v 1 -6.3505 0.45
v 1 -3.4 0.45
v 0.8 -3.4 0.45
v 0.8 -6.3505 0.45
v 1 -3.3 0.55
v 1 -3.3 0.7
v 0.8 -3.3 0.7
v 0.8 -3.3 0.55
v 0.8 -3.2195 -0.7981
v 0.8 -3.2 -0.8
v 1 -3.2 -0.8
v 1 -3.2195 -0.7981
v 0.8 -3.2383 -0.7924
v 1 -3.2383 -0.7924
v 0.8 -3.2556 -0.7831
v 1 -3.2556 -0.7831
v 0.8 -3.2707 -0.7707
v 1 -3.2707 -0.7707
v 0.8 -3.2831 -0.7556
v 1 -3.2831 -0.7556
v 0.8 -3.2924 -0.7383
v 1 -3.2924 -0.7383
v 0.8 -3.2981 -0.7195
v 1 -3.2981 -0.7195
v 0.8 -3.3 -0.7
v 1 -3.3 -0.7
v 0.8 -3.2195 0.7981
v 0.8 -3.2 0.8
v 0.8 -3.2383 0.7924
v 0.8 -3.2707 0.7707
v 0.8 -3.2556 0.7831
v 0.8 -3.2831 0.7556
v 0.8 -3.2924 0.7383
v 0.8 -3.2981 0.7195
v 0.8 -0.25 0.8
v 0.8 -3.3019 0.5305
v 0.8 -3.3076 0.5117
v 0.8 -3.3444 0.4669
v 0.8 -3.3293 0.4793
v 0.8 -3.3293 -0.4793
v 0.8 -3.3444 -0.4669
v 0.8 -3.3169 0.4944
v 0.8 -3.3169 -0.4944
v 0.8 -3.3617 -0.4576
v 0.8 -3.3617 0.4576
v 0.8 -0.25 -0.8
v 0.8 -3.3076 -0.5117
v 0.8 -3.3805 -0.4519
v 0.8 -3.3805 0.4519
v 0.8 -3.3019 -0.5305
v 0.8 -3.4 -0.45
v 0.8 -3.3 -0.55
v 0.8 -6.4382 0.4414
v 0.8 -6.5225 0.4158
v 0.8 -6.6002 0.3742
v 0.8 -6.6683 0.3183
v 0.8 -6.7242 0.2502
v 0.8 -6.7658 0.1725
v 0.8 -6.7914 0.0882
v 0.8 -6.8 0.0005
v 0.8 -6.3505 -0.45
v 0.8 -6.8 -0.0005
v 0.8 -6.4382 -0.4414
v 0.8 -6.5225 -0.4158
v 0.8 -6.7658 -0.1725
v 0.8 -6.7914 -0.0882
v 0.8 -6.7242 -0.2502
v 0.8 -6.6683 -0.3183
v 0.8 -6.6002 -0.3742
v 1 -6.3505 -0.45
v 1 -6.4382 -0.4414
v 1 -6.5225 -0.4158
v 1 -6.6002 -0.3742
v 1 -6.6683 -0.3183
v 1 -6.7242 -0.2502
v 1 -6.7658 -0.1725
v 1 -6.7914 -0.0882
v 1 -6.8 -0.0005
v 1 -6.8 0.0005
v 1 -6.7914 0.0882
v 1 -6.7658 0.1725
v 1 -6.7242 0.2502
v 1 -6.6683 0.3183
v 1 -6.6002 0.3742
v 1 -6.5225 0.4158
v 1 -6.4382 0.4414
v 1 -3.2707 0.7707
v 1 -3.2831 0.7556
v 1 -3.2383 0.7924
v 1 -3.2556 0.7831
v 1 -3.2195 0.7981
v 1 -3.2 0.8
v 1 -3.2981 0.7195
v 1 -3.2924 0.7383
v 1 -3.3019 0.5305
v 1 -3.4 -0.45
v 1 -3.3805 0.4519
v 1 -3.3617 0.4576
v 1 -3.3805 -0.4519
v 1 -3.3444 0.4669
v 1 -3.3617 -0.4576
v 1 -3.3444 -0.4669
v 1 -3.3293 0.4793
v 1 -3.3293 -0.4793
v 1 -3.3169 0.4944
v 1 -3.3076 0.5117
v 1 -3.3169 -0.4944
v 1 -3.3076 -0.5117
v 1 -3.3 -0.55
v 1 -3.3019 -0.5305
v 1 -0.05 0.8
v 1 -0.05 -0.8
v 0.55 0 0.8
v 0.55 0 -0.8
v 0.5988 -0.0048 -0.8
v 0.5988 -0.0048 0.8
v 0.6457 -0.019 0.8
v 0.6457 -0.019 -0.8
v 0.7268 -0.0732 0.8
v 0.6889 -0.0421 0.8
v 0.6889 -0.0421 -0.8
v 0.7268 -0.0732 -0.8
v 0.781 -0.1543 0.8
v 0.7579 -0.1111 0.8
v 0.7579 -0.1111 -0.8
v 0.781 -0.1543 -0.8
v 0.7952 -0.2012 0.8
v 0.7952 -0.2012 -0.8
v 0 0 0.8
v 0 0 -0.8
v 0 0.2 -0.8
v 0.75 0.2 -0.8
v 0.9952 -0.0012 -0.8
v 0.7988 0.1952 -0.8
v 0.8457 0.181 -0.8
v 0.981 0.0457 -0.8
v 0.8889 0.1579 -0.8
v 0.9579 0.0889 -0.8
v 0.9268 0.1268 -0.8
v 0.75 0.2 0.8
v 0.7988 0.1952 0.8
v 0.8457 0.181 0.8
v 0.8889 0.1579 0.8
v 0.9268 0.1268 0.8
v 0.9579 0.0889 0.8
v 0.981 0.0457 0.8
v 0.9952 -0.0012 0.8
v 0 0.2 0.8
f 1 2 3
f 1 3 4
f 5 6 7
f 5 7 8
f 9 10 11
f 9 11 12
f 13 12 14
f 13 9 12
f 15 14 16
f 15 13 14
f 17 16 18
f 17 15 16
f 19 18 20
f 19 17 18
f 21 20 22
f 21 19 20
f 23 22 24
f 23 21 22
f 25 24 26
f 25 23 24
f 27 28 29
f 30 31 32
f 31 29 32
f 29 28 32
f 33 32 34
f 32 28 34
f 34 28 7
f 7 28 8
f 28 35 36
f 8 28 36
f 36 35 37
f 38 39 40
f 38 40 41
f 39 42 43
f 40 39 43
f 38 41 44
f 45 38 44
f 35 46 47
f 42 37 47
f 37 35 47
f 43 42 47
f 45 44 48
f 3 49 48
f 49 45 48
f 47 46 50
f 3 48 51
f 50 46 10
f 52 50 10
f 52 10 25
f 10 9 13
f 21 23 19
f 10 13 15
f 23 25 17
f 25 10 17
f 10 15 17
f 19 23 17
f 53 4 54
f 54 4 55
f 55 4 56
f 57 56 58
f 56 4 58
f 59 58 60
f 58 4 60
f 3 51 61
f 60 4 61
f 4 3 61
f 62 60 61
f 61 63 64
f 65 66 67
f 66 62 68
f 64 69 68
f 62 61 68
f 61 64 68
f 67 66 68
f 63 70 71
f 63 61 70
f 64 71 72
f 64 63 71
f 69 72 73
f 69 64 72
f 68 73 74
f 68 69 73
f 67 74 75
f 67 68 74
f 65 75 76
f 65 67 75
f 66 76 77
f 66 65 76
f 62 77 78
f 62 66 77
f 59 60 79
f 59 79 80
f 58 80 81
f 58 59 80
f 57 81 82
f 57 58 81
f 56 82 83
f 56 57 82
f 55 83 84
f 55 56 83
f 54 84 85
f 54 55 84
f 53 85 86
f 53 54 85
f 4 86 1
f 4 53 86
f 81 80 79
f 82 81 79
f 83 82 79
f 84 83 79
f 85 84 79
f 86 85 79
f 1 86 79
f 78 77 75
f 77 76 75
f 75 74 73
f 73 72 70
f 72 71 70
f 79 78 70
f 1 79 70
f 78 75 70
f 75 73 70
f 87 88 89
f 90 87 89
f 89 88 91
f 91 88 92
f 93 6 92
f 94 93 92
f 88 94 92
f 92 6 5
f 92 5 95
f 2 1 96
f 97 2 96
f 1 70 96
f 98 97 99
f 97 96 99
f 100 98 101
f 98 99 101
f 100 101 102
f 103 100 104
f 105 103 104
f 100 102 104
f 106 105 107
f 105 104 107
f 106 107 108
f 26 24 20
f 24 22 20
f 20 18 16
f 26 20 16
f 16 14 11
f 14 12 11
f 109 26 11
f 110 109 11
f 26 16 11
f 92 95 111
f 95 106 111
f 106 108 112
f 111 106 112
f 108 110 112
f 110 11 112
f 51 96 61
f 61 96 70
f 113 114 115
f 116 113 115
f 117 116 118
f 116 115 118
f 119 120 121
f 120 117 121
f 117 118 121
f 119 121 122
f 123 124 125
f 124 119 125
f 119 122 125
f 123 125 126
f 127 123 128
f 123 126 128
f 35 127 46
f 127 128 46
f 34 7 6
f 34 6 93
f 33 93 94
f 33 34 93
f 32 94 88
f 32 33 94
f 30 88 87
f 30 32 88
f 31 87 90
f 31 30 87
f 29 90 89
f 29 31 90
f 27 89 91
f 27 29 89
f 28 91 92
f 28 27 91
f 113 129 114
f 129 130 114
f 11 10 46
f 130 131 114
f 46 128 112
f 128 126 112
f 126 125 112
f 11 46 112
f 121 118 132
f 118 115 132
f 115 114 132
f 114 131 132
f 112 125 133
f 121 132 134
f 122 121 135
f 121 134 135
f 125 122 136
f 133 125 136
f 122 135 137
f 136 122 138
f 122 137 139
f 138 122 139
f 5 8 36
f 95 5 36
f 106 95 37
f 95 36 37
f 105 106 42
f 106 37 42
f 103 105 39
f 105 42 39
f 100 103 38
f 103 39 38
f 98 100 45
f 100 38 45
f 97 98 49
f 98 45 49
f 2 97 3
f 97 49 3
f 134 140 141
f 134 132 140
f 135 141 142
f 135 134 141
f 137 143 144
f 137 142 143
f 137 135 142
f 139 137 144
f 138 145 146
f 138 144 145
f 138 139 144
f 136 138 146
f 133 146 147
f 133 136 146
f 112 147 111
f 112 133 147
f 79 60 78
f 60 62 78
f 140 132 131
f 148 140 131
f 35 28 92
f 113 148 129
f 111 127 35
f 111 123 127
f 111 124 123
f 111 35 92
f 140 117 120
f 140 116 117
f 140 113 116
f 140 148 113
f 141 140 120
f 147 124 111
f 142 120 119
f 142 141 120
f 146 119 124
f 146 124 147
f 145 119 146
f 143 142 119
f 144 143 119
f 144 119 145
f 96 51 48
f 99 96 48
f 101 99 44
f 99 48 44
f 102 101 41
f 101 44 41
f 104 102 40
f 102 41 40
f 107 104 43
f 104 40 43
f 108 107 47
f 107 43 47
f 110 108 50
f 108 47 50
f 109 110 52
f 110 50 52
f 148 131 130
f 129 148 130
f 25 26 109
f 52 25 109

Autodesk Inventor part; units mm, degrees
ref_plane "YZ Plane" through (0, 0, 0) normal (1, 0, 0) x (0, 1, 0)
ref_plane "XZ Plane" through (0, 0, 0) normal (0, 1, 0) x (-1, 0, 0)
ref_plane "XY Plane" through (0, 0, 0) normal (0, 0, 1) x (1, 0, 0)
sketch "Sketch1" plane through (0, 0, 0) normal (0, 0, 1) x (1, 0, 0)
  line L0 (0, 0) -> (0.55, 0)
  line L1 (0.8, -0.25) -> (0.8, -6.8)
  line L2 (0.8, -6.8) -> (1, -6.8)
  line L3 (1, -6.8) -> (1, -0.05)
  line L4 (0.75, 0.2) -> (0, 0.2)
  line L5 (0, 0.2) -> (0, 0)
  arc A0 (0.8, -0.25) -> (0.55, 0) centre (0.55, -0.25) ccw
  arc A1 (1, -0.05) -> (0.75, 0.2) centre (0.75, -0.05) ccw
  point P0 (0.8, 0)
  point P1 (1, 0.2)
  dimension "d0" = 0.2
  dimension "d1" = 0.2
  dimension "d2" = 7
  dimension "d3" = 1
  dimension "d6" = 0.25
extrude "Extrusion1" add sketch "Sketch1" along normal mid plane 1.6
sketch "Sketch2" plane through (1, -6.8, 0.8) normal (1, 0, 0) x (0, 0, -1)
  line L0 (0, 6.75) -> (0, 0) projected
  line L1 (1.6, 0) -> (0, 0) projected
  line L2 (1.6, 0) -> (1.6, 6.75) projected
  line L3 (0, 3.5) -> (0.35, 3.5)
  line L4 (0.35, 3.5) -> (0.35, 0)
  line L5 (0.35, 0) -> (0, 0)
  line L6 (0, 0) -> (0, 3.5)
  line L7 (1.6, 3.5) -> (1.25, 3.5)
  line L8 (1.25, 3.5) -> (1.25, 0)
  line L9 (1.25, 0) -> (1.6, 0)
  line L10 (1.6, 0) -> (1.6, 3.5)
  point P0 (0.8, 6.8)
  dimension "d8" = 0.9
  dimension "d9" = 3.5
  dimension "d10" = 3.5
  dimension "d11" = 0.35
extrude "Extrusion2" cut sketch "Sketch2" against normal through all
fillet "Fillet1" radius 0.45 2 edges at (0.9, -6.8, 0.45) (0.9, -6.8, -0.45)
fillet "Fillet2" radius 0.1 4 edges at (0.9, -3.3, 0.8) (0.9, -3.3, 0.45) (0.9, -3.3, -0.45) (0.9, -3.3, -0.8)
equation "\"d1\" = d0"
equation "\"d10\" = d9"
properties part number "12mm Incremental Encoder Pin"
